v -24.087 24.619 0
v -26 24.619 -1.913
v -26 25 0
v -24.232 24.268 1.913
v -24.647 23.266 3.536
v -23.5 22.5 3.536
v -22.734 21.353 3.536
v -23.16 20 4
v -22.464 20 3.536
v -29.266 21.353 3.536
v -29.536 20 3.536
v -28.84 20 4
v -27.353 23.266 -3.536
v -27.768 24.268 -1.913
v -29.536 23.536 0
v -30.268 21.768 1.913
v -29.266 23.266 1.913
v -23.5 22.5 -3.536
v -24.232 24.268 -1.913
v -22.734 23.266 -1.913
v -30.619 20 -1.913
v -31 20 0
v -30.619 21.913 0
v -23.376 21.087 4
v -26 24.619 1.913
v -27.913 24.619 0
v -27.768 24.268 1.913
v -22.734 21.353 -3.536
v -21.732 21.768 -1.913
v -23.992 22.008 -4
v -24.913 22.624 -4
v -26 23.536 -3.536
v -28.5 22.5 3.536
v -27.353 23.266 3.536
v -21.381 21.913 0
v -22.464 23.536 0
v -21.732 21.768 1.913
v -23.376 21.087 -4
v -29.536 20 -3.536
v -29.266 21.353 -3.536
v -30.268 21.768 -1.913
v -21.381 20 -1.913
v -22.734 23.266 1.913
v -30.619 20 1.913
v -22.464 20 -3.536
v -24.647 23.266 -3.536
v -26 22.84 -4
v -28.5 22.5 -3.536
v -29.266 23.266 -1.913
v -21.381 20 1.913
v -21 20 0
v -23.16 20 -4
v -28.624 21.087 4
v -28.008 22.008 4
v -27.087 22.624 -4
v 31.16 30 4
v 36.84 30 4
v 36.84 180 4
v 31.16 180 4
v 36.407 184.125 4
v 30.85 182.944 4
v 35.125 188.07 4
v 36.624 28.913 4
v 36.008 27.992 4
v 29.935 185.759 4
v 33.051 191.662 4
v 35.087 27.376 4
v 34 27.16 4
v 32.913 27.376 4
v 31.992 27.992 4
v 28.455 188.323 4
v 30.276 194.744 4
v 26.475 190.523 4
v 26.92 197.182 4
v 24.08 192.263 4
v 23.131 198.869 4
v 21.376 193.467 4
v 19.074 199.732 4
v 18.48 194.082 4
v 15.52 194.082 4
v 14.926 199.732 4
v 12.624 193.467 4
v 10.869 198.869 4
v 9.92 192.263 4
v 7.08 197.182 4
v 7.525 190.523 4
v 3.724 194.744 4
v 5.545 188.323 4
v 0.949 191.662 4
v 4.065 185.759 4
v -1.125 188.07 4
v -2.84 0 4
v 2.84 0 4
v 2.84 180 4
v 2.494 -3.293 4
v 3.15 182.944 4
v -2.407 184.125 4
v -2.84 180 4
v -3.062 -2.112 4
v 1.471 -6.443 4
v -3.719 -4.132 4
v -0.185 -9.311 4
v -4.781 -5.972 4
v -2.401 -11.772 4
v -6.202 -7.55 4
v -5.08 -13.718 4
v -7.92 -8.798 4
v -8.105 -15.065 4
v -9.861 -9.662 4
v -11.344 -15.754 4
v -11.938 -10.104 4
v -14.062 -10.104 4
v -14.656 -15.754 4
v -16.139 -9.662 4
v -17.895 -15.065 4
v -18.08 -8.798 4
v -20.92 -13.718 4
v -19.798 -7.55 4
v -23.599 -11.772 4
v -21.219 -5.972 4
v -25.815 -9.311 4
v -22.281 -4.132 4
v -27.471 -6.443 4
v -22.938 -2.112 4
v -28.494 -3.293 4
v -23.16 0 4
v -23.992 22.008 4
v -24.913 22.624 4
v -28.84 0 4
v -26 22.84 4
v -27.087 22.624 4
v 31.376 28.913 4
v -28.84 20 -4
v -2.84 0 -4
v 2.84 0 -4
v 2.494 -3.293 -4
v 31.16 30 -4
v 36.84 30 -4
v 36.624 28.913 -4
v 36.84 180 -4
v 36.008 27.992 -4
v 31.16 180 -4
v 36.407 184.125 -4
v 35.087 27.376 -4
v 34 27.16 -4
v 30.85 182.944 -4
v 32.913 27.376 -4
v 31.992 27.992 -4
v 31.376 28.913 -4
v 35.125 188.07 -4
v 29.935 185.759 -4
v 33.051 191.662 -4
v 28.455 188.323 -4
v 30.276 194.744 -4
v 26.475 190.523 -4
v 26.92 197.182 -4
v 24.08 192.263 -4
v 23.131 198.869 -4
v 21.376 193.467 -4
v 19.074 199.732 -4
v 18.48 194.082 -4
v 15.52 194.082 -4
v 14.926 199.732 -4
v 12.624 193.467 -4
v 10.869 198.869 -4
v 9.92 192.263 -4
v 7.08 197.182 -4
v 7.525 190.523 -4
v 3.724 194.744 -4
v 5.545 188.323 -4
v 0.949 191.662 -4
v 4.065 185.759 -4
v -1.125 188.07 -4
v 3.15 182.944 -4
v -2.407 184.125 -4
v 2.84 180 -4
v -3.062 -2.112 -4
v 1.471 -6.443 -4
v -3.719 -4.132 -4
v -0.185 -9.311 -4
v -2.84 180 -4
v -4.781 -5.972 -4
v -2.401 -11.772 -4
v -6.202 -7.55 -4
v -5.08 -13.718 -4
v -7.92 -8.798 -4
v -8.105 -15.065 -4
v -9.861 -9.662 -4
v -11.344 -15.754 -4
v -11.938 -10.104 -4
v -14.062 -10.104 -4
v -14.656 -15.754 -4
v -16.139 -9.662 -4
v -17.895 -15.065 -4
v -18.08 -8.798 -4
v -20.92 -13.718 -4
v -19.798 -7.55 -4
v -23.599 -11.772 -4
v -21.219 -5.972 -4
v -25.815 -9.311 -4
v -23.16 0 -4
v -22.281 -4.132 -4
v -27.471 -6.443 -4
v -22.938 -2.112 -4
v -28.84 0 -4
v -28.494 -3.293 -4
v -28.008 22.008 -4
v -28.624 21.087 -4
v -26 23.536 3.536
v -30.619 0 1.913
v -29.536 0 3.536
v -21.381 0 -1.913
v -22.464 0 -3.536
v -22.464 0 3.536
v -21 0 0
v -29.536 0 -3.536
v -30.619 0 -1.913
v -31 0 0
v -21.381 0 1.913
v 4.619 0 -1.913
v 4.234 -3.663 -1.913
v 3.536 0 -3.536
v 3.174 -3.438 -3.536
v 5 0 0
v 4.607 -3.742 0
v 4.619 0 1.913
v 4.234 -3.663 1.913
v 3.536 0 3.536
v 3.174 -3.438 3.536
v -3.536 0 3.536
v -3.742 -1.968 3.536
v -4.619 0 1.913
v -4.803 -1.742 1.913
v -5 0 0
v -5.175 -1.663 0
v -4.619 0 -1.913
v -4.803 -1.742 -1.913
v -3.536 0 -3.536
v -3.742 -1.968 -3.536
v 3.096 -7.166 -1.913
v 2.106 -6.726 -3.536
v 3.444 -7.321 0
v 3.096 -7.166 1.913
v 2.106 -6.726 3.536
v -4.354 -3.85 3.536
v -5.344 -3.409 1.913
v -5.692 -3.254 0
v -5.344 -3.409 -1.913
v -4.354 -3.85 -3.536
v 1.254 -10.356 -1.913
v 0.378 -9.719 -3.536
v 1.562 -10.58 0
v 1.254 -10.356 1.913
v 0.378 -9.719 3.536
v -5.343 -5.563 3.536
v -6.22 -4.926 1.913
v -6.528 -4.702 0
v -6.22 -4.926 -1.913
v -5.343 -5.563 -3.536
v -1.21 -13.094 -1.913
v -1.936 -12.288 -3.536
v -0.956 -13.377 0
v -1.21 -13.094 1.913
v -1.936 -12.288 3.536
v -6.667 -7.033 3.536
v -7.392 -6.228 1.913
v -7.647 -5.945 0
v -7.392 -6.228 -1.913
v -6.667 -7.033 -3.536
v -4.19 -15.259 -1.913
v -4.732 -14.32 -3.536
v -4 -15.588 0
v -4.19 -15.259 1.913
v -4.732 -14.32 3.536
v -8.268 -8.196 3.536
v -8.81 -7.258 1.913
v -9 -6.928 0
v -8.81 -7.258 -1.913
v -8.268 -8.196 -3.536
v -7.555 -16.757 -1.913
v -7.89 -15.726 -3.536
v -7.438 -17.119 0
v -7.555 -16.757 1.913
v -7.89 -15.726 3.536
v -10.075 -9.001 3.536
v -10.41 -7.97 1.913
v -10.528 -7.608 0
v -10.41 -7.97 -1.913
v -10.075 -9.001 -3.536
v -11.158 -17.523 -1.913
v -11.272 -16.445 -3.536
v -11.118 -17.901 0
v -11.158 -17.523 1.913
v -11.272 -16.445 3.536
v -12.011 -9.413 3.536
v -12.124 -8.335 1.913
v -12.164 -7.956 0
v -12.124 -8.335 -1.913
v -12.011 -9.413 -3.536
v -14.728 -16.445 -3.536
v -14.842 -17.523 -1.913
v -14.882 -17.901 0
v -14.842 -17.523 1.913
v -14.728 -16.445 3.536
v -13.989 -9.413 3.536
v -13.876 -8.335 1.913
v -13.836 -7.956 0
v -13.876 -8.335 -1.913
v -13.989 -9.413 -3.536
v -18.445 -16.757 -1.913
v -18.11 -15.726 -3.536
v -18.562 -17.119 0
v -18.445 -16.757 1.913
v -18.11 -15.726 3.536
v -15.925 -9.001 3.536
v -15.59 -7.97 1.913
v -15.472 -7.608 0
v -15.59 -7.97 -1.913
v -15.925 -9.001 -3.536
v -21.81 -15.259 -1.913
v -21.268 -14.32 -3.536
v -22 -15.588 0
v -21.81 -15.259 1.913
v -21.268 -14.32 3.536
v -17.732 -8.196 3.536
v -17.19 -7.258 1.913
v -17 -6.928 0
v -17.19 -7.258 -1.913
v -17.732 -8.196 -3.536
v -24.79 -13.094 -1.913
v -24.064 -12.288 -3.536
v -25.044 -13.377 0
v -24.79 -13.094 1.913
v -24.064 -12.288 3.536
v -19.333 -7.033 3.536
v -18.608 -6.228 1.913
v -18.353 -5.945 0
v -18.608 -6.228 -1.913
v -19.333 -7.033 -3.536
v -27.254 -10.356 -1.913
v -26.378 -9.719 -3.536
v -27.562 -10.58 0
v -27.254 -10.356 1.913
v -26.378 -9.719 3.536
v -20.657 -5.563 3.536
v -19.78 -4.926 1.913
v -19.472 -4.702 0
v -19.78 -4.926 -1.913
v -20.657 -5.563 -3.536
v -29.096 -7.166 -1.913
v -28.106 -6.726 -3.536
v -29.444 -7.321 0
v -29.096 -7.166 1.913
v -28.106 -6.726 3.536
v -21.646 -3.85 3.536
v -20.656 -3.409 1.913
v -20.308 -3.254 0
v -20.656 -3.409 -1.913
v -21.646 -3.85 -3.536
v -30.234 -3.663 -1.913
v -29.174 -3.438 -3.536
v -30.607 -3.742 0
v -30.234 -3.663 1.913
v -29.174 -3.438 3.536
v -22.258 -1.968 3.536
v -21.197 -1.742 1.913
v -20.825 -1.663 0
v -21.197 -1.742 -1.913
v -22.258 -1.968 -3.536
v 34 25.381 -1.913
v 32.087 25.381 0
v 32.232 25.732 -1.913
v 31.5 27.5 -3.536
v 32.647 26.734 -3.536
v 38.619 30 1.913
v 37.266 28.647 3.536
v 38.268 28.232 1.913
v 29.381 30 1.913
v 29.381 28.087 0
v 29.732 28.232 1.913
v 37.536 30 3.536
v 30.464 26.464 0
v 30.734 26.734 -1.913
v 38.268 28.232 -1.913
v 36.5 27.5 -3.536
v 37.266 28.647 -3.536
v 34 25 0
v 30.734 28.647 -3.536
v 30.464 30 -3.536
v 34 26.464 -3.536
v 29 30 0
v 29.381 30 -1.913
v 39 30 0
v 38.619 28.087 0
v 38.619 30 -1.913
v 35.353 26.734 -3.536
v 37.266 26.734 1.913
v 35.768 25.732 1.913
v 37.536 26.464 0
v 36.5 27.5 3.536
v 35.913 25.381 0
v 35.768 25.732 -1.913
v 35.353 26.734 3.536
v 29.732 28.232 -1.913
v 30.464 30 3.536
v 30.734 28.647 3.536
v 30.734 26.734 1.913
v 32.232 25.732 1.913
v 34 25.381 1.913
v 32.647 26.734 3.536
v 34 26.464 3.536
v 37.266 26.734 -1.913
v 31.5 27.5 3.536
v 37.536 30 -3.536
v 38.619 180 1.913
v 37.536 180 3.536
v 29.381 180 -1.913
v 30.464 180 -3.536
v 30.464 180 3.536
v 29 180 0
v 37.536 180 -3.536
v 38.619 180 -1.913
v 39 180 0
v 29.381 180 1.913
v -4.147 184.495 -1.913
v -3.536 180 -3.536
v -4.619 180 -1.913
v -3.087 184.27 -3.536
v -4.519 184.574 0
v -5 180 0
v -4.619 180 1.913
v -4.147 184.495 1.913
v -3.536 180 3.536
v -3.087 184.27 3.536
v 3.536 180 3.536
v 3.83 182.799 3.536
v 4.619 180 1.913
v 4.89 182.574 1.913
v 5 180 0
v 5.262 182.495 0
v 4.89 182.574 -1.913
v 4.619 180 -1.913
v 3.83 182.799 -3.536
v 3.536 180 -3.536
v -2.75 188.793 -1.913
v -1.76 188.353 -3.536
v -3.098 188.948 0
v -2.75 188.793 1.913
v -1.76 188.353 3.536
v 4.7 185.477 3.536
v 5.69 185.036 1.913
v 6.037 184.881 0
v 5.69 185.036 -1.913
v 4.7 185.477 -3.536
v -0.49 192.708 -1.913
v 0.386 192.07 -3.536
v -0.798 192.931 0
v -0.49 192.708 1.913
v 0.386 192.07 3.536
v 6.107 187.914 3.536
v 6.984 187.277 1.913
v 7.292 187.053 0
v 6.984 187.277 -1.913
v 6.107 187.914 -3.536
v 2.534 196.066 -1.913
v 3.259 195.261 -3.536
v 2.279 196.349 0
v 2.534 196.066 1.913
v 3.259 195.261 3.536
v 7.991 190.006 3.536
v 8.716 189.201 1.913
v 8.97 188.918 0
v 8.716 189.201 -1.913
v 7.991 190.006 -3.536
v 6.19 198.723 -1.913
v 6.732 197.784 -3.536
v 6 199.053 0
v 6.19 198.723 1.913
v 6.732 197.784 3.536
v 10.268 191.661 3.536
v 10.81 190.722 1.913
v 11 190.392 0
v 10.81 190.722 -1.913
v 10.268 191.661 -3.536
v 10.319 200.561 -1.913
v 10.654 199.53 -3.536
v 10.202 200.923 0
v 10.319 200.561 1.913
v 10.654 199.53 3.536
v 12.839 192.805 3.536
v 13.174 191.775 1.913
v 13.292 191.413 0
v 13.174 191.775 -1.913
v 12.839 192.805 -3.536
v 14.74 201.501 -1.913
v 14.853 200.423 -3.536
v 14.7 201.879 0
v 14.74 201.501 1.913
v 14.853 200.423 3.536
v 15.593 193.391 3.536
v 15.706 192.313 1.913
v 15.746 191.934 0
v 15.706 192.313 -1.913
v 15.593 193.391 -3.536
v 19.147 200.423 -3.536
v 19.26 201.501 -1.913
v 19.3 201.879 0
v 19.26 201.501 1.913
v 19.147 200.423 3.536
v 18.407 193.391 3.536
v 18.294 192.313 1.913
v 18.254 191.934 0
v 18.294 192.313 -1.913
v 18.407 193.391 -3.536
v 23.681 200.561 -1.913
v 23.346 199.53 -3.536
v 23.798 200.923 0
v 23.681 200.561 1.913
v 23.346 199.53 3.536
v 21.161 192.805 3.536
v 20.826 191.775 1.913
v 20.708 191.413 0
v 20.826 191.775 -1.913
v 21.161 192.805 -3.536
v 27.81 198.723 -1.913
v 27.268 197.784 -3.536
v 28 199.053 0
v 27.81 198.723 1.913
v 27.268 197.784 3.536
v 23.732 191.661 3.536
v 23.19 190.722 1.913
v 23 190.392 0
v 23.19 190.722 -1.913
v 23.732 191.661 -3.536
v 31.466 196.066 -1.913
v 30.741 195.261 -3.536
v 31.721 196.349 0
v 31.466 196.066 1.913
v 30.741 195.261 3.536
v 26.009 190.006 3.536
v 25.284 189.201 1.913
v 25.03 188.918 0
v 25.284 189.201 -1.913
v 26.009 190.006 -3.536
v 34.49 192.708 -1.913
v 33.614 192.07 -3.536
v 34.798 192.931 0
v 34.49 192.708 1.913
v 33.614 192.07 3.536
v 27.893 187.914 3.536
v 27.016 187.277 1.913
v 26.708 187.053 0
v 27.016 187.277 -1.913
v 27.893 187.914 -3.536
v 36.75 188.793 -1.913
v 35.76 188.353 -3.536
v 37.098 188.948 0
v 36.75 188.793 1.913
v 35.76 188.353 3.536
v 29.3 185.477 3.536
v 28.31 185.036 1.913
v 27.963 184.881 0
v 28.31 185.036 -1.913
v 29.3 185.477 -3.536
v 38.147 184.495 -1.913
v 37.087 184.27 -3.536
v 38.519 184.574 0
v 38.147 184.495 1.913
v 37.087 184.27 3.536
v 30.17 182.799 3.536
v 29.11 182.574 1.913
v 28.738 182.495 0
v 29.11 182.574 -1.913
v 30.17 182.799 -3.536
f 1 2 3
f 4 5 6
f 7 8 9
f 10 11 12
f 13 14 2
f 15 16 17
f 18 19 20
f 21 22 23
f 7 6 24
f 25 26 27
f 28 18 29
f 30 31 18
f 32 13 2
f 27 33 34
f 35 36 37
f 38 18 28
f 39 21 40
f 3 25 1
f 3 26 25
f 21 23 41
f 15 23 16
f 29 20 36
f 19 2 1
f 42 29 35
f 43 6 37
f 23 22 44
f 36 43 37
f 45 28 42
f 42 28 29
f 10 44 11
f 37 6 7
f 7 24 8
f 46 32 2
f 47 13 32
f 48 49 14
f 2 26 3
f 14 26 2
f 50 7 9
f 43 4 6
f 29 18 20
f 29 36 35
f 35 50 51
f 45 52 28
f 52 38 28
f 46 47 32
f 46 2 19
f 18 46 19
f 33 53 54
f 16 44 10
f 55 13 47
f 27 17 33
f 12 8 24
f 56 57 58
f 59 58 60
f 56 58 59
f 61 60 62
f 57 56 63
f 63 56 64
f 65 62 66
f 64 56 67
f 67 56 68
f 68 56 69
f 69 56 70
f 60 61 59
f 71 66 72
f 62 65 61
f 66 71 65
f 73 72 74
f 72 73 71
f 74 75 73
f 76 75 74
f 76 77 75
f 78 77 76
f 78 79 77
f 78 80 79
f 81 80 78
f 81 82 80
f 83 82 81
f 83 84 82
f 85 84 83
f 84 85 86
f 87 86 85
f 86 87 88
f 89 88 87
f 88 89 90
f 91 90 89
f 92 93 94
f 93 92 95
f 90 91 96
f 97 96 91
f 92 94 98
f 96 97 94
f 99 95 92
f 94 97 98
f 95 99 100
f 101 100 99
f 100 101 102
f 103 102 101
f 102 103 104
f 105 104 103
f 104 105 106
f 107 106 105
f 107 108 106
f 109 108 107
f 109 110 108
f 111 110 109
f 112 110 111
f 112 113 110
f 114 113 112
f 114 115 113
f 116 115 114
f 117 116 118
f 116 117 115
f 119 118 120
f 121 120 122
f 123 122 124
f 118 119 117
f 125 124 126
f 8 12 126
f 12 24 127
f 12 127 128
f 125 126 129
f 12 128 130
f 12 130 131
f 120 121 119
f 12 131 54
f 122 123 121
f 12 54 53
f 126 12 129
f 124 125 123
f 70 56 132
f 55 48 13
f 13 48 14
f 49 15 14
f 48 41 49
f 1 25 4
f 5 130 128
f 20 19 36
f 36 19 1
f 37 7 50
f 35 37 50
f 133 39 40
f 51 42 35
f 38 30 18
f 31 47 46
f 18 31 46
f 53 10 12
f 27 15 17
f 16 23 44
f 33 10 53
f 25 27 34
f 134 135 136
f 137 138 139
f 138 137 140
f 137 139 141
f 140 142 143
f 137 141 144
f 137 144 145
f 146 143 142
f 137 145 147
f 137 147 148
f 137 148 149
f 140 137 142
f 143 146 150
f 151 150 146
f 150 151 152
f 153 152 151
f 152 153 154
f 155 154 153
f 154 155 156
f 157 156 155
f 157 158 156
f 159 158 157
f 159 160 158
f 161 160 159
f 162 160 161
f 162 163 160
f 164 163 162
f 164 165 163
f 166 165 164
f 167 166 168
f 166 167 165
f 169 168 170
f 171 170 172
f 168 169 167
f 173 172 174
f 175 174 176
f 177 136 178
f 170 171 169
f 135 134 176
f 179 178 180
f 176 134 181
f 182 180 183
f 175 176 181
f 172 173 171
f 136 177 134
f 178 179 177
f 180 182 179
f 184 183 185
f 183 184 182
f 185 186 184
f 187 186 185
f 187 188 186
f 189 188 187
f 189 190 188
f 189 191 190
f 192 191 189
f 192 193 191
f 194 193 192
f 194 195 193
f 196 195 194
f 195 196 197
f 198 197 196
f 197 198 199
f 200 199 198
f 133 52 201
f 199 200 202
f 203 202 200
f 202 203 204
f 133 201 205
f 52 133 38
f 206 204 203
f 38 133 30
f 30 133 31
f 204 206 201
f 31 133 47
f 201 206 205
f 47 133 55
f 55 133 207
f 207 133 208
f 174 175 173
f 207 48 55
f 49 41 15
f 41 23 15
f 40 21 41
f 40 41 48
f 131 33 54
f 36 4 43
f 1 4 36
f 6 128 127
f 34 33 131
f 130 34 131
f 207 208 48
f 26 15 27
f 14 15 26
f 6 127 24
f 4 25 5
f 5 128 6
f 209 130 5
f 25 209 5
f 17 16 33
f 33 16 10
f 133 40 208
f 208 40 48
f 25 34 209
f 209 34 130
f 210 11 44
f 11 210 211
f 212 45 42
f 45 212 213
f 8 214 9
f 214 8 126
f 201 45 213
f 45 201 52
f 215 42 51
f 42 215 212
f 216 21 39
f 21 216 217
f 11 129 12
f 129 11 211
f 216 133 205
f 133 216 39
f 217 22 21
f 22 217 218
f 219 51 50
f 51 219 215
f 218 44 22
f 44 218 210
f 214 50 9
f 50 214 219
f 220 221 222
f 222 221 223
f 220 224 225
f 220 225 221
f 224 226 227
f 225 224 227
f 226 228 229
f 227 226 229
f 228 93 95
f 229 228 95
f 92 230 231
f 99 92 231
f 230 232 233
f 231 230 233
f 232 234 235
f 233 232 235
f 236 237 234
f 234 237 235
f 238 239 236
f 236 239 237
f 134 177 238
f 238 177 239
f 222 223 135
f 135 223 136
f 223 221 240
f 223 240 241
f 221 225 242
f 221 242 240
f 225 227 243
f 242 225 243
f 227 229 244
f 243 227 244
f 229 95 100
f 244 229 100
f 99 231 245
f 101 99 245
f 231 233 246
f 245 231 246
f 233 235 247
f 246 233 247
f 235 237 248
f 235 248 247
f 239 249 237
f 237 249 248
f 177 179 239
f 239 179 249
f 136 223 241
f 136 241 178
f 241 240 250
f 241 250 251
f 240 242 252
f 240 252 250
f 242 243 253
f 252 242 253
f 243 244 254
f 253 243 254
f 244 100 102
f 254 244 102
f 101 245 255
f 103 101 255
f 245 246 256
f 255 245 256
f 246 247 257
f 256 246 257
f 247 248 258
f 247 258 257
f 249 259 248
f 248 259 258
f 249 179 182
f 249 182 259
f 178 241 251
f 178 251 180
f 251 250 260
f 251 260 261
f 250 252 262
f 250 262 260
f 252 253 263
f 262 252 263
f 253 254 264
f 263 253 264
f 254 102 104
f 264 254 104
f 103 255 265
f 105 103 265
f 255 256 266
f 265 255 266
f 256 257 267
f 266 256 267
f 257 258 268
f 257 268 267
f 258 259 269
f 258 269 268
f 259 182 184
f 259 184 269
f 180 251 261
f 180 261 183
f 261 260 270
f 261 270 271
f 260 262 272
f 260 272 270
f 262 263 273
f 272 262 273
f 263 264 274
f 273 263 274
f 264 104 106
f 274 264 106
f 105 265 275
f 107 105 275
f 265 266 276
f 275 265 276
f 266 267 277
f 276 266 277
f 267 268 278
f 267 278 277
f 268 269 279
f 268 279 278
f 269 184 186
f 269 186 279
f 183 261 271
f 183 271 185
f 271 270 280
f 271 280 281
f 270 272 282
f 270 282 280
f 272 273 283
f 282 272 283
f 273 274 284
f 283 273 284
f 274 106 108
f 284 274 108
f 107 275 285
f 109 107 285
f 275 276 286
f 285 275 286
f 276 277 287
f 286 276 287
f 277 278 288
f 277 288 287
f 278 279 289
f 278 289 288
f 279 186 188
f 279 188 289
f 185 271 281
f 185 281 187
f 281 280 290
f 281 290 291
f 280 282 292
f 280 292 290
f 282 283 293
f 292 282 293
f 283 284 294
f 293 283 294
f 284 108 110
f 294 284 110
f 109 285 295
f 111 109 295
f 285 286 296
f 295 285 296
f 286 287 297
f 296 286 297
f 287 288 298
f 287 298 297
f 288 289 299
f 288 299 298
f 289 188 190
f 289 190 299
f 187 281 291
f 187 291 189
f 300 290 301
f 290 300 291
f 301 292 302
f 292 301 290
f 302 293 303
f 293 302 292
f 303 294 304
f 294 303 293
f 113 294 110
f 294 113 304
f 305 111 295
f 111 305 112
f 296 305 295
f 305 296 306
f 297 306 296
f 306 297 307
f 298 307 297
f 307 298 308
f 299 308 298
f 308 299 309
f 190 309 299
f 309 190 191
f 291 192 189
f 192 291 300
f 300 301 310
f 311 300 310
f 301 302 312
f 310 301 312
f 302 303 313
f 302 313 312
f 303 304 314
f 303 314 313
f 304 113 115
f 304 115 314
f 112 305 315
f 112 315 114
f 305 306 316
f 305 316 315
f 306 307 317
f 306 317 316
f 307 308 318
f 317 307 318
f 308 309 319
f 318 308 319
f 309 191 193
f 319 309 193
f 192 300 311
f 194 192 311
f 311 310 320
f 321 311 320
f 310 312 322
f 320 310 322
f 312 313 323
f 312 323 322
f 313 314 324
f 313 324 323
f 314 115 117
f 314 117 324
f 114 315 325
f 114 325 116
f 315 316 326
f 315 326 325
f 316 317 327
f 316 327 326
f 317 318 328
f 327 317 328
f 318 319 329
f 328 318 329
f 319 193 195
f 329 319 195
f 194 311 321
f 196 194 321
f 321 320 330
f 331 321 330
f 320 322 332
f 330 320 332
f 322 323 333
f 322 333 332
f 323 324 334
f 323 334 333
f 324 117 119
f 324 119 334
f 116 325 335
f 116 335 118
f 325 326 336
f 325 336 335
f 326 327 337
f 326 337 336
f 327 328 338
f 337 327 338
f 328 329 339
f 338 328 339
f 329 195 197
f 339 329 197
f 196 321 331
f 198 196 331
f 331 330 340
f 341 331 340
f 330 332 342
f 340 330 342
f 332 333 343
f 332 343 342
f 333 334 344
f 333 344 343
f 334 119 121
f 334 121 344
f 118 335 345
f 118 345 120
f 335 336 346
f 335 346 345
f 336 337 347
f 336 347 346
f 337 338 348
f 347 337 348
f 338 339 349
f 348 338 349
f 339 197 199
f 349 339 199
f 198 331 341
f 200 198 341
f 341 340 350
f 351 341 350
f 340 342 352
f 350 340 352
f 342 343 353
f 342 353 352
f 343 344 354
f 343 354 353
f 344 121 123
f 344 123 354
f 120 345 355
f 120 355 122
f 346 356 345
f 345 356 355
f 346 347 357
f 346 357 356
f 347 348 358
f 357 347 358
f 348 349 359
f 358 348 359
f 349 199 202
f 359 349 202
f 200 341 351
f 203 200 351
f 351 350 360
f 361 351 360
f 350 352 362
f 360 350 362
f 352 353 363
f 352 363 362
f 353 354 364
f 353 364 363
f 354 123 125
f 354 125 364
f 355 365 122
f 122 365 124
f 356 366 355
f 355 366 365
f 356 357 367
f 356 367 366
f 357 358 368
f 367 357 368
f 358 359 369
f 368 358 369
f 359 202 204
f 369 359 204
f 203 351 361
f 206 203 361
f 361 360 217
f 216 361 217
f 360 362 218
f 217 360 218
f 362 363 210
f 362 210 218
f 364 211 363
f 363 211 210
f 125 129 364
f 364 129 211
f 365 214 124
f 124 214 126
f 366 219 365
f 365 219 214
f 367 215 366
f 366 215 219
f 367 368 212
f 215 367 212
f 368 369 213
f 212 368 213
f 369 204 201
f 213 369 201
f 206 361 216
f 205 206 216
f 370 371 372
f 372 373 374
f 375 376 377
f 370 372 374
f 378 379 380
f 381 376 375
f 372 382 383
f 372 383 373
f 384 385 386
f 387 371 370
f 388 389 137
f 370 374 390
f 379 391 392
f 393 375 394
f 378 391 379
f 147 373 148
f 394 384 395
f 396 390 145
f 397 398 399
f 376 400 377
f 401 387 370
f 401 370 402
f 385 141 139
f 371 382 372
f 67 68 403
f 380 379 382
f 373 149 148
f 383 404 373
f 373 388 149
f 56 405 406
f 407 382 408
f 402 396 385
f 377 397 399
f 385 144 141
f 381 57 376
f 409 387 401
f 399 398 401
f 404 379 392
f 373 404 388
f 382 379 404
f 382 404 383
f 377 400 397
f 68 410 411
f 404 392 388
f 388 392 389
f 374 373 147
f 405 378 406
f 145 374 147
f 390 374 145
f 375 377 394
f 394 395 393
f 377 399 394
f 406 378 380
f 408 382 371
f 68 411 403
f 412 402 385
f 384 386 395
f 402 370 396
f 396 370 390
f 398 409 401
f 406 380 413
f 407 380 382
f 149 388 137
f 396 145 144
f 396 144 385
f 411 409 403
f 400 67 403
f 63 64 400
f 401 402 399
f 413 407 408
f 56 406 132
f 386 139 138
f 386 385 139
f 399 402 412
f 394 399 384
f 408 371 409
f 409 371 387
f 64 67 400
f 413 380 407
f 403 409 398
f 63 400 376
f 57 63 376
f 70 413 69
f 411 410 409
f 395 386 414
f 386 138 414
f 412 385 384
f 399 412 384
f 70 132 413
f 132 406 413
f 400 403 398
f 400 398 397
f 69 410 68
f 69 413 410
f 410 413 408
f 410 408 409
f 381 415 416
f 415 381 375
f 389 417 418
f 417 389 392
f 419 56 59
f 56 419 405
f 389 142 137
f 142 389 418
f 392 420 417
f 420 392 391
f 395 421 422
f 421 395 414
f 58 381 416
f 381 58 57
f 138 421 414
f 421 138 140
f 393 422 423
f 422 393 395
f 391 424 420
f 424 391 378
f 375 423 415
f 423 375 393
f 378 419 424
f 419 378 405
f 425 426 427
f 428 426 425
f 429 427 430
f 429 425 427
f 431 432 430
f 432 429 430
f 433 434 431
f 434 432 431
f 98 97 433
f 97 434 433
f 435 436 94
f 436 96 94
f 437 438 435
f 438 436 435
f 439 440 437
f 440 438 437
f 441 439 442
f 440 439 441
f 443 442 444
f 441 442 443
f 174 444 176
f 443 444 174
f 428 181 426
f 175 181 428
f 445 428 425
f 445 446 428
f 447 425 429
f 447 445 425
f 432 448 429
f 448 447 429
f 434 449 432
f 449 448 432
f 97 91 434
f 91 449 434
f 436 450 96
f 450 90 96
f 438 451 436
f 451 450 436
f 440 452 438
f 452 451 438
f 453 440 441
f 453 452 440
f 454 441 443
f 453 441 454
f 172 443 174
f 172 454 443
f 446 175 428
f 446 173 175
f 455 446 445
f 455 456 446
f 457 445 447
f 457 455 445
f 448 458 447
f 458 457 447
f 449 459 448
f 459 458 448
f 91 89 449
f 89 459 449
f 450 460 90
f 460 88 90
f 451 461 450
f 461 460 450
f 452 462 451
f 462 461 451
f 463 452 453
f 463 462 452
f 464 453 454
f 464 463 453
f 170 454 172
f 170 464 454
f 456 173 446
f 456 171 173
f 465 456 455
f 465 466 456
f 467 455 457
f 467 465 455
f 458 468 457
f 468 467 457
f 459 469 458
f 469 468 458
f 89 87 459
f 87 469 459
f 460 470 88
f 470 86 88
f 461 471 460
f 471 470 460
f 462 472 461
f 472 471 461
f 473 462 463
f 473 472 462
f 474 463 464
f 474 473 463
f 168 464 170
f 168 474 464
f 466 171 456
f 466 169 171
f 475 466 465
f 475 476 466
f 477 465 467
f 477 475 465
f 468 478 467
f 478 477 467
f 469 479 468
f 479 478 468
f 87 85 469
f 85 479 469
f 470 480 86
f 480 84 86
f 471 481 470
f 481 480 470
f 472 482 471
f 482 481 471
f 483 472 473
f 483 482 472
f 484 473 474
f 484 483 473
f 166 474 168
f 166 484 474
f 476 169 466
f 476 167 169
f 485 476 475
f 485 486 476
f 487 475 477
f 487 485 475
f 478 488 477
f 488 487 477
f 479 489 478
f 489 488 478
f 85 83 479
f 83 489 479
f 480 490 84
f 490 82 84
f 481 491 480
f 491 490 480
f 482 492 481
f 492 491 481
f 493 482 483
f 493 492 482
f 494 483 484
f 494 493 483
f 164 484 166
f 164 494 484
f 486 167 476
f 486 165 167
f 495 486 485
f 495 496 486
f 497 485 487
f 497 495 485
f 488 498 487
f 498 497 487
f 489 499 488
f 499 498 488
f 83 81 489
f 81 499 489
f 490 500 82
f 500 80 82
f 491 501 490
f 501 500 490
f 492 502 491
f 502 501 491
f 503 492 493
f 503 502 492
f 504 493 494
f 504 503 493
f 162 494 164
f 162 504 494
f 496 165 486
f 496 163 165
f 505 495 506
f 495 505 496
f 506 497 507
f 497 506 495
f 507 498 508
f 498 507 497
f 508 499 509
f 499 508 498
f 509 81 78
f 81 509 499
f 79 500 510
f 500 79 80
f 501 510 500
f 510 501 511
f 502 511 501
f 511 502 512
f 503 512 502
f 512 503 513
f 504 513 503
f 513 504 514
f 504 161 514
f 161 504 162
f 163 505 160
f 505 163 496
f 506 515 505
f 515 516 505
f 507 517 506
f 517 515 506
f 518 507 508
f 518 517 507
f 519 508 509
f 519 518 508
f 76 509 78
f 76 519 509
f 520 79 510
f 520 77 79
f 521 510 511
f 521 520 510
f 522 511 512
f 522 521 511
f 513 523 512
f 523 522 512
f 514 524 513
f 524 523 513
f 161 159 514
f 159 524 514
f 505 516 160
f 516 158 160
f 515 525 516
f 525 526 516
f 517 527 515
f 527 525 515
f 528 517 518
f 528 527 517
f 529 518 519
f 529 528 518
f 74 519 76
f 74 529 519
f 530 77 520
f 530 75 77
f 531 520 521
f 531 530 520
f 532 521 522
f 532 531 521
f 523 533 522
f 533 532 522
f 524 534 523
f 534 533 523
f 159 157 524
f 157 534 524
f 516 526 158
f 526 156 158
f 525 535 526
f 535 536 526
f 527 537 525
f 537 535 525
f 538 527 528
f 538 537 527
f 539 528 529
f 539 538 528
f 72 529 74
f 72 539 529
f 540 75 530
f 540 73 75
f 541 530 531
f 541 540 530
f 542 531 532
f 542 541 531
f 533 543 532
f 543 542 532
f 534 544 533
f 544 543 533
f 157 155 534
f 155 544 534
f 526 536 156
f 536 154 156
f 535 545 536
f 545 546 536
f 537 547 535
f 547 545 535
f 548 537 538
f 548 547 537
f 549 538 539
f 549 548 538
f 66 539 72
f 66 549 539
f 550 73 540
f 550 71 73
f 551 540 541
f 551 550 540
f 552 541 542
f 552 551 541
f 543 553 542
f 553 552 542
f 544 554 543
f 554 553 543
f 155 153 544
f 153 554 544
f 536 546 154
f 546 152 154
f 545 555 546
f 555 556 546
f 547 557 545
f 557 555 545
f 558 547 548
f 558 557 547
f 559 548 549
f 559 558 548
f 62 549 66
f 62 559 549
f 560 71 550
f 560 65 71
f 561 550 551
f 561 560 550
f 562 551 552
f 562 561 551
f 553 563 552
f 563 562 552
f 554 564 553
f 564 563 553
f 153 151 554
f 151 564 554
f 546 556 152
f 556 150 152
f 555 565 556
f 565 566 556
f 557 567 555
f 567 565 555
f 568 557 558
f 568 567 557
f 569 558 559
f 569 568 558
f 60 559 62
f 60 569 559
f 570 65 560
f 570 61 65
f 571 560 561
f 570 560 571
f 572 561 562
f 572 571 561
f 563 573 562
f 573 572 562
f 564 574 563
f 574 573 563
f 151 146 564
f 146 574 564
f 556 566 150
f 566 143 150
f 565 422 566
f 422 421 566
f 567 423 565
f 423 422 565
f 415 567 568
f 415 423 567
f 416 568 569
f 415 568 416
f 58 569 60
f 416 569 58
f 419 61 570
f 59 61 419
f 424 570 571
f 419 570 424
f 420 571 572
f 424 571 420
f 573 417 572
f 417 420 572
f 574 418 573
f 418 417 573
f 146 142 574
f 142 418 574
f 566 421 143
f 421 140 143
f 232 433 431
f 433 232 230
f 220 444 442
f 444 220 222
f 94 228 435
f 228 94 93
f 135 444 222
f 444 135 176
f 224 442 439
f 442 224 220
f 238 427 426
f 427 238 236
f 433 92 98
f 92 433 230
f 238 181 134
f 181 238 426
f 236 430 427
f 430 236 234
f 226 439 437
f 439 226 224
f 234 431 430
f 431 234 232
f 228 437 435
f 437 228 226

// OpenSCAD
small_diameter = 8;
small_extension = 20;
large_diameter = 12;
large_extension = 150;

middle_length = 180;

pipe_diameter = 5;
trunc_thickness = 8;

module cross_section() {
  intersection() {
    square([pipe_diameter * 2, trunc_thickness], center=true);
    circle(pipe_diameter);
  }
}
module half_cross_section() {
  intersection() {
    translate([pipe_diameter,0,0])
      square([pipe_diameter * 2, trunc_thickness], center=true);
    circle(pipe_diameter);
  }
}

module cap(length) {
  translate([0,length,0])
    rotate_extrude(angle=180, convexity = 10)
      half_cross_section();
  rotate([-90,0,0])
    linear_extrude(length)
      cross_section();
}
module small_hook() {
  small_minor_diameter = small_diameter + pipe_diameter;
  translate([-small_minor_diameter,0,0]) {
    rotate_extrude(angle=-180, convexity = 10) 
      translate([small_minor_diameter,0,0])
        cross_section();
    translate([-small_minor_diameter,0,0]) cap(small_extension);
  }
}

module large_hook() {
  rotate([0,0,180]) {
    large_minor_diameter = large_diameter + pipe_diameter;
    translate([-large_minor_diameter,0,0]) {
      rotate_extrude(angle=-180, convexity = 10) 
        translate([large_minor_diameter,0,0])
          cross_section();
      translate([-large_minor_diameter,0,0]) cap(large_extension);
    }
  }
}
module middle(length) {
  rotate([-90,0,0])
    linear_extrude(length)
      cross_section();
}

module main(){
  small_hook();
  translate([0,middle_length,0])
    large_hook();
  middle(middle_length);
}

main();
